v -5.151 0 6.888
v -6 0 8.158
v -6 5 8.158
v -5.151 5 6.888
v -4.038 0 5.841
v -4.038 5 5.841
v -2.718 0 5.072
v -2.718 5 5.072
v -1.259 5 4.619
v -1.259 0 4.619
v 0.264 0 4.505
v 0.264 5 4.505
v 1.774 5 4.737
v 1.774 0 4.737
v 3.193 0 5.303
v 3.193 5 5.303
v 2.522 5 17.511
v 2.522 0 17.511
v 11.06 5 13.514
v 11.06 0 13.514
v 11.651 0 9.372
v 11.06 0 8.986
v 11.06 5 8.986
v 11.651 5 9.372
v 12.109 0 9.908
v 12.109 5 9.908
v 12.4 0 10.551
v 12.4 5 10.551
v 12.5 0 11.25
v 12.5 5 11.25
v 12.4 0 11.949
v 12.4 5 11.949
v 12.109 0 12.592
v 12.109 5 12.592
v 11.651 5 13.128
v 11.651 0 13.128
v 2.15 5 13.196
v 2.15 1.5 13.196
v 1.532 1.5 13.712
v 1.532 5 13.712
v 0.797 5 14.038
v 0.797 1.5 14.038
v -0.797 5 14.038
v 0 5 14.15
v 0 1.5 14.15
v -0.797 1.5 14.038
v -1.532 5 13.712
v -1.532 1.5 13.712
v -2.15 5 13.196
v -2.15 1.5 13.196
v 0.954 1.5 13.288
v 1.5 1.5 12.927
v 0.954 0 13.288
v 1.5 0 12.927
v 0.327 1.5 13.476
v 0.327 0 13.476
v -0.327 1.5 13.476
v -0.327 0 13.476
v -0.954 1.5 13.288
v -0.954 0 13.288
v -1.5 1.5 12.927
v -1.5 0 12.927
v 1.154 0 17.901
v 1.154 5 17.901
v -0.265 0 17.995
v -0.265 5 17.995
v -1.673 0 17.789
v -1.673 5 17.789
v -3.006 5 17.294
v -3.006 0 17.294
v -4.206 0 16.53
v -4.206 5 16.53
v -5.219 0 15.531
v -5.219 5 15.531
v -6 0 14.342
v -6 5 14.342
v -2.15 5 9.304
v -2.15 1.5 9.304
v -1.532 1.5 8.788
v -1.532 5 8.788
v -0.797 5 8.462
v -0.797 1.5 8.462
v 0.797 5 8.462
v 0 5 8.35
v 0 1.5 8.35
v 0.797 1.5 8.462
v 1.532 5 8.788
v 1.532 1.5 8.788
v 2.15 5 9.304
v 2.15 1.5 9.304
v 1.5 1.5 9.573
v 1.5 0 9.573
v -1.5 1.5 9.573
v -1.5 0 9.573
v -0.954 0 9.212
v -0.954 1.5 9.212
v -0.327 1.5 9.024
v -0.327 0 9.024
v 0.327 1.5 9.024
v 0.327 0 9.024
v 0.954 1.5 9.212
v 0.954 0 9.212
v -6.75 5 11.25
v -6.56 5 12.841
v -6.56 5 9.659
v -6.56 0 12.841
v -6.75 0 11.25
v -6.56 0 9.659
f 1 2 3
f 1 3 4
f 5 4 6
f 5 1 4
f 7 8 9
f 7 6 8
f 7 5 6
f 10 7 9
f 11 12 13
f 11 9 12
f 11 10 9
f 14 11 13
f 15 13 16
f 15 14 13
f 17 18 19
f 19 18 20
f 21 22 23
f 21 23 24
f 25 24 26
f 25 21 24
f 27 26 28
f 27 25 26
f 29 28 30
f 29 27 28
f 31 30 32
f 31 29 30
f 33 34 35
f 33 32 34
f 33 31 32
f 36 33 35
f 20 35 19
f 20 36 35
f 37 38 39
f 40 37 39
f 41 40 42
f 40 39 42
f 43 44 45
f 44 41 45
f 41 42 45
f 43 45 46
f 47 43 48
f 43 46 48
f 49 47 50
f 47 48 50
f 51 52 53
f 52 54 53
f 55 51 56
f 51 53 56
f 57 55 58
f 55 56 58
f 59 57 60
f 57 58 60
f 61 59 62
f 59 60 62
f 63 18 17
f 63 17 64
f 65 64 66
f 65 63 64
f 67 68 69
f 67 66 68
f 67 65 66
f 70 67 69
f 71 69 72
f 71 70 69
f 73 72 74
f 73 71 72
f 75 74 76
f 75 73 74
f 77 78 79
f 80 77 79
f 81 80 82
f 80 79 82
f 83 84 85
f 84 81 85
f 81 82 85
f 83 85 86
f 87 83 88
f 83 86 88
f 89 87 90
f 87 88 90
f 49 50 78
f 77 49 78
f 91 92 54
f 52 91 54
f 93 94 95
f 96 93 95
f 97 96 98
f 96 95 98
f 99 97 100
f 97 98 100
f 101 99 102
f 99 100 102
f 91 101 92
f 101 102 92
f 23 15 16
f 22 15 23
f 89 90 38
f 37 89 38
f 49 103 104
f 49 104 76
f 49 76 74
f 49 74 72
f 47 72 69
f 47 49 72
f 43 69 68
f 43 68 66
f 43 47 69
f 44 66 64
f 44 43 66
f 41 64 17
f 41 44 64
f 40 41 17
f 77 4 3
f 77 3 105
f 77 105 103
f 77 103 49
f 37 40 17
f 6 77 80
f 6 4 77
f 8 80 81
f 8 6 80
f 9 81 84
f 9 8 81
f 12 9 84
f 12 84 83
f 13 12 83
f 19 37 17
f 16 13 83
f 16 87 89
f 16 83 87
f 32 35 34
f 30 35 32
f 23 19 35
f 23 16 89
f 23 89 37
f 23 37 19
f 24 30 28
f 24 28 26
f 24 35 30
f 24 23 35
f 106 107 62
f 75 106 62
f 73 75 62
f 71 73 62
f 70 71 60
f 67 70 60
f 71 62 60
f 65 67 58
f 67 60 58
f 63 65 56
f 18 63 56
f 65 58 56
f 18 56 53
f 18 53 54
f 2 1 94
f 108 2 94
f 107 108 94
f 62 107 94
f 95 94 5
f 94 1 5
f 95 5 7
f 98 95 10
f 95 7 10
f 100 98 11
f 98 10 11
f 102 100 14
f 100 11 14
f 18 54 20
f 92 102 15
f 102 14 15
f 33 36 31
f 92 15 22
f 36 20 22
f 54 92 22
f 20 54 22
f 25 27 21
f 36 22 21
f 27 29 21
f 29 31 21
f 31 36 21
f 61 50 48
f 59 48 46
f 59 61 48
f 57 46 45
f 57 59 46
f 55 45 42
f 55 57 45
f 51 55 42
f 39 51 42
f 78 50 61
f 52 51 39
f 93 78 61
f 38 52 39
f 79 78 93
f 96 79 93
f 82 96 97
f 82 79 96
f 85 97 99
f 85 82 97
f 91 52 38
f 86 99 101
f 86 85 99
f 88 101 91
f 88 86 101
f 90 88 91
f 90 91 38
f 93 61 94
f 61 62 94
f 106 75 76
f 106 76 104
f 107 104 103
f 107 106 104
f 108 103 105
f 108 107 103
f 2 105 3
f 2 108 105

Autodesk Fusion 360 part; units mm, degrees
sketch "Sketch1" plane through (0, 0, 0) normal (0, 1, 0) x (1, 0, 0)
  arc A0 (-2, -13.1375) -> (2, -13.1375) centre (0, -11.25) ccw
  line L0 (-2, -13.1375) -> (-2, -9.3625)
  arc A1 (2, -9.3625) -> (-2, -9.3625) centre (0, -11.25) ccw
  line L1 (2, -9.3625) -> (2, -13.1375)
  line L2 (-2.15, -13.1962) -> (-2.15, -9.3038)
  arc A2 (2.15, -9.3038) -> (-2.15, -9.3038) centre (0, -11.25) ccw
  line L3 (2.15, -9.3038) -> (2.15, -13.1962)
  arc A3 (-2.15, -13.1962) -> (2.15, -13.1962) centre (0, -11.25) ccw
  arc A4 (-6, -14.3423) -> (6, -14.3423) centre (0, -11.25) ccw
  line L4 (6, -8.1577) -> (6, -14.3423)
  arc A5 (6, -8.1577) -> (-6, -8.1577) centre (0, -11.25) ccw
  line L5 (-6, -14.3423) -> (-6, -8.1577)
  circle A6 centre (10, -11.25) radius 2.5
  line L6 (2.5219, -17.5112) -> (11.06, -13.5142)
  line L7 (3.1933, -5.3031) -> (11.06, -8.9858)
  line L8 (1.5, -9.5729) -> (1.5, -12.9271)
  arc A7 (-1.5, -12.9271) -> (1.5, -12.9271) centre (0, -11.25) ccw
  line L9 (-1.5, -12.9271) -> (-1.5, -9.5729)
  arc A8 (1.5, -9.5729) -> (-1.5, -9.5729) centre (0, -11.25) ccw
  circle A9 centre (0, -11.25) radius 6.75
  dimension "d1" = 0.15
  dimension "d2" = -4
  dimension "d3" = 5
  dimension "d4" = 10
  dimension "d7" = 0.5
  dimension "d10" = 13.5
extrude "Extrude1" add sketch "Sketch1" along normal blind 5 contours A4 L4 A5 L5 L6 A9 | L5 A9 | A4 A5 A6 L6 L7 A9 | L4 A9 | A6
extrude "Extrude2" add sketch "Sketch1" along normal blind 1.5 contours A0 L0 A1 L1 | L2 A2 L3 A3
